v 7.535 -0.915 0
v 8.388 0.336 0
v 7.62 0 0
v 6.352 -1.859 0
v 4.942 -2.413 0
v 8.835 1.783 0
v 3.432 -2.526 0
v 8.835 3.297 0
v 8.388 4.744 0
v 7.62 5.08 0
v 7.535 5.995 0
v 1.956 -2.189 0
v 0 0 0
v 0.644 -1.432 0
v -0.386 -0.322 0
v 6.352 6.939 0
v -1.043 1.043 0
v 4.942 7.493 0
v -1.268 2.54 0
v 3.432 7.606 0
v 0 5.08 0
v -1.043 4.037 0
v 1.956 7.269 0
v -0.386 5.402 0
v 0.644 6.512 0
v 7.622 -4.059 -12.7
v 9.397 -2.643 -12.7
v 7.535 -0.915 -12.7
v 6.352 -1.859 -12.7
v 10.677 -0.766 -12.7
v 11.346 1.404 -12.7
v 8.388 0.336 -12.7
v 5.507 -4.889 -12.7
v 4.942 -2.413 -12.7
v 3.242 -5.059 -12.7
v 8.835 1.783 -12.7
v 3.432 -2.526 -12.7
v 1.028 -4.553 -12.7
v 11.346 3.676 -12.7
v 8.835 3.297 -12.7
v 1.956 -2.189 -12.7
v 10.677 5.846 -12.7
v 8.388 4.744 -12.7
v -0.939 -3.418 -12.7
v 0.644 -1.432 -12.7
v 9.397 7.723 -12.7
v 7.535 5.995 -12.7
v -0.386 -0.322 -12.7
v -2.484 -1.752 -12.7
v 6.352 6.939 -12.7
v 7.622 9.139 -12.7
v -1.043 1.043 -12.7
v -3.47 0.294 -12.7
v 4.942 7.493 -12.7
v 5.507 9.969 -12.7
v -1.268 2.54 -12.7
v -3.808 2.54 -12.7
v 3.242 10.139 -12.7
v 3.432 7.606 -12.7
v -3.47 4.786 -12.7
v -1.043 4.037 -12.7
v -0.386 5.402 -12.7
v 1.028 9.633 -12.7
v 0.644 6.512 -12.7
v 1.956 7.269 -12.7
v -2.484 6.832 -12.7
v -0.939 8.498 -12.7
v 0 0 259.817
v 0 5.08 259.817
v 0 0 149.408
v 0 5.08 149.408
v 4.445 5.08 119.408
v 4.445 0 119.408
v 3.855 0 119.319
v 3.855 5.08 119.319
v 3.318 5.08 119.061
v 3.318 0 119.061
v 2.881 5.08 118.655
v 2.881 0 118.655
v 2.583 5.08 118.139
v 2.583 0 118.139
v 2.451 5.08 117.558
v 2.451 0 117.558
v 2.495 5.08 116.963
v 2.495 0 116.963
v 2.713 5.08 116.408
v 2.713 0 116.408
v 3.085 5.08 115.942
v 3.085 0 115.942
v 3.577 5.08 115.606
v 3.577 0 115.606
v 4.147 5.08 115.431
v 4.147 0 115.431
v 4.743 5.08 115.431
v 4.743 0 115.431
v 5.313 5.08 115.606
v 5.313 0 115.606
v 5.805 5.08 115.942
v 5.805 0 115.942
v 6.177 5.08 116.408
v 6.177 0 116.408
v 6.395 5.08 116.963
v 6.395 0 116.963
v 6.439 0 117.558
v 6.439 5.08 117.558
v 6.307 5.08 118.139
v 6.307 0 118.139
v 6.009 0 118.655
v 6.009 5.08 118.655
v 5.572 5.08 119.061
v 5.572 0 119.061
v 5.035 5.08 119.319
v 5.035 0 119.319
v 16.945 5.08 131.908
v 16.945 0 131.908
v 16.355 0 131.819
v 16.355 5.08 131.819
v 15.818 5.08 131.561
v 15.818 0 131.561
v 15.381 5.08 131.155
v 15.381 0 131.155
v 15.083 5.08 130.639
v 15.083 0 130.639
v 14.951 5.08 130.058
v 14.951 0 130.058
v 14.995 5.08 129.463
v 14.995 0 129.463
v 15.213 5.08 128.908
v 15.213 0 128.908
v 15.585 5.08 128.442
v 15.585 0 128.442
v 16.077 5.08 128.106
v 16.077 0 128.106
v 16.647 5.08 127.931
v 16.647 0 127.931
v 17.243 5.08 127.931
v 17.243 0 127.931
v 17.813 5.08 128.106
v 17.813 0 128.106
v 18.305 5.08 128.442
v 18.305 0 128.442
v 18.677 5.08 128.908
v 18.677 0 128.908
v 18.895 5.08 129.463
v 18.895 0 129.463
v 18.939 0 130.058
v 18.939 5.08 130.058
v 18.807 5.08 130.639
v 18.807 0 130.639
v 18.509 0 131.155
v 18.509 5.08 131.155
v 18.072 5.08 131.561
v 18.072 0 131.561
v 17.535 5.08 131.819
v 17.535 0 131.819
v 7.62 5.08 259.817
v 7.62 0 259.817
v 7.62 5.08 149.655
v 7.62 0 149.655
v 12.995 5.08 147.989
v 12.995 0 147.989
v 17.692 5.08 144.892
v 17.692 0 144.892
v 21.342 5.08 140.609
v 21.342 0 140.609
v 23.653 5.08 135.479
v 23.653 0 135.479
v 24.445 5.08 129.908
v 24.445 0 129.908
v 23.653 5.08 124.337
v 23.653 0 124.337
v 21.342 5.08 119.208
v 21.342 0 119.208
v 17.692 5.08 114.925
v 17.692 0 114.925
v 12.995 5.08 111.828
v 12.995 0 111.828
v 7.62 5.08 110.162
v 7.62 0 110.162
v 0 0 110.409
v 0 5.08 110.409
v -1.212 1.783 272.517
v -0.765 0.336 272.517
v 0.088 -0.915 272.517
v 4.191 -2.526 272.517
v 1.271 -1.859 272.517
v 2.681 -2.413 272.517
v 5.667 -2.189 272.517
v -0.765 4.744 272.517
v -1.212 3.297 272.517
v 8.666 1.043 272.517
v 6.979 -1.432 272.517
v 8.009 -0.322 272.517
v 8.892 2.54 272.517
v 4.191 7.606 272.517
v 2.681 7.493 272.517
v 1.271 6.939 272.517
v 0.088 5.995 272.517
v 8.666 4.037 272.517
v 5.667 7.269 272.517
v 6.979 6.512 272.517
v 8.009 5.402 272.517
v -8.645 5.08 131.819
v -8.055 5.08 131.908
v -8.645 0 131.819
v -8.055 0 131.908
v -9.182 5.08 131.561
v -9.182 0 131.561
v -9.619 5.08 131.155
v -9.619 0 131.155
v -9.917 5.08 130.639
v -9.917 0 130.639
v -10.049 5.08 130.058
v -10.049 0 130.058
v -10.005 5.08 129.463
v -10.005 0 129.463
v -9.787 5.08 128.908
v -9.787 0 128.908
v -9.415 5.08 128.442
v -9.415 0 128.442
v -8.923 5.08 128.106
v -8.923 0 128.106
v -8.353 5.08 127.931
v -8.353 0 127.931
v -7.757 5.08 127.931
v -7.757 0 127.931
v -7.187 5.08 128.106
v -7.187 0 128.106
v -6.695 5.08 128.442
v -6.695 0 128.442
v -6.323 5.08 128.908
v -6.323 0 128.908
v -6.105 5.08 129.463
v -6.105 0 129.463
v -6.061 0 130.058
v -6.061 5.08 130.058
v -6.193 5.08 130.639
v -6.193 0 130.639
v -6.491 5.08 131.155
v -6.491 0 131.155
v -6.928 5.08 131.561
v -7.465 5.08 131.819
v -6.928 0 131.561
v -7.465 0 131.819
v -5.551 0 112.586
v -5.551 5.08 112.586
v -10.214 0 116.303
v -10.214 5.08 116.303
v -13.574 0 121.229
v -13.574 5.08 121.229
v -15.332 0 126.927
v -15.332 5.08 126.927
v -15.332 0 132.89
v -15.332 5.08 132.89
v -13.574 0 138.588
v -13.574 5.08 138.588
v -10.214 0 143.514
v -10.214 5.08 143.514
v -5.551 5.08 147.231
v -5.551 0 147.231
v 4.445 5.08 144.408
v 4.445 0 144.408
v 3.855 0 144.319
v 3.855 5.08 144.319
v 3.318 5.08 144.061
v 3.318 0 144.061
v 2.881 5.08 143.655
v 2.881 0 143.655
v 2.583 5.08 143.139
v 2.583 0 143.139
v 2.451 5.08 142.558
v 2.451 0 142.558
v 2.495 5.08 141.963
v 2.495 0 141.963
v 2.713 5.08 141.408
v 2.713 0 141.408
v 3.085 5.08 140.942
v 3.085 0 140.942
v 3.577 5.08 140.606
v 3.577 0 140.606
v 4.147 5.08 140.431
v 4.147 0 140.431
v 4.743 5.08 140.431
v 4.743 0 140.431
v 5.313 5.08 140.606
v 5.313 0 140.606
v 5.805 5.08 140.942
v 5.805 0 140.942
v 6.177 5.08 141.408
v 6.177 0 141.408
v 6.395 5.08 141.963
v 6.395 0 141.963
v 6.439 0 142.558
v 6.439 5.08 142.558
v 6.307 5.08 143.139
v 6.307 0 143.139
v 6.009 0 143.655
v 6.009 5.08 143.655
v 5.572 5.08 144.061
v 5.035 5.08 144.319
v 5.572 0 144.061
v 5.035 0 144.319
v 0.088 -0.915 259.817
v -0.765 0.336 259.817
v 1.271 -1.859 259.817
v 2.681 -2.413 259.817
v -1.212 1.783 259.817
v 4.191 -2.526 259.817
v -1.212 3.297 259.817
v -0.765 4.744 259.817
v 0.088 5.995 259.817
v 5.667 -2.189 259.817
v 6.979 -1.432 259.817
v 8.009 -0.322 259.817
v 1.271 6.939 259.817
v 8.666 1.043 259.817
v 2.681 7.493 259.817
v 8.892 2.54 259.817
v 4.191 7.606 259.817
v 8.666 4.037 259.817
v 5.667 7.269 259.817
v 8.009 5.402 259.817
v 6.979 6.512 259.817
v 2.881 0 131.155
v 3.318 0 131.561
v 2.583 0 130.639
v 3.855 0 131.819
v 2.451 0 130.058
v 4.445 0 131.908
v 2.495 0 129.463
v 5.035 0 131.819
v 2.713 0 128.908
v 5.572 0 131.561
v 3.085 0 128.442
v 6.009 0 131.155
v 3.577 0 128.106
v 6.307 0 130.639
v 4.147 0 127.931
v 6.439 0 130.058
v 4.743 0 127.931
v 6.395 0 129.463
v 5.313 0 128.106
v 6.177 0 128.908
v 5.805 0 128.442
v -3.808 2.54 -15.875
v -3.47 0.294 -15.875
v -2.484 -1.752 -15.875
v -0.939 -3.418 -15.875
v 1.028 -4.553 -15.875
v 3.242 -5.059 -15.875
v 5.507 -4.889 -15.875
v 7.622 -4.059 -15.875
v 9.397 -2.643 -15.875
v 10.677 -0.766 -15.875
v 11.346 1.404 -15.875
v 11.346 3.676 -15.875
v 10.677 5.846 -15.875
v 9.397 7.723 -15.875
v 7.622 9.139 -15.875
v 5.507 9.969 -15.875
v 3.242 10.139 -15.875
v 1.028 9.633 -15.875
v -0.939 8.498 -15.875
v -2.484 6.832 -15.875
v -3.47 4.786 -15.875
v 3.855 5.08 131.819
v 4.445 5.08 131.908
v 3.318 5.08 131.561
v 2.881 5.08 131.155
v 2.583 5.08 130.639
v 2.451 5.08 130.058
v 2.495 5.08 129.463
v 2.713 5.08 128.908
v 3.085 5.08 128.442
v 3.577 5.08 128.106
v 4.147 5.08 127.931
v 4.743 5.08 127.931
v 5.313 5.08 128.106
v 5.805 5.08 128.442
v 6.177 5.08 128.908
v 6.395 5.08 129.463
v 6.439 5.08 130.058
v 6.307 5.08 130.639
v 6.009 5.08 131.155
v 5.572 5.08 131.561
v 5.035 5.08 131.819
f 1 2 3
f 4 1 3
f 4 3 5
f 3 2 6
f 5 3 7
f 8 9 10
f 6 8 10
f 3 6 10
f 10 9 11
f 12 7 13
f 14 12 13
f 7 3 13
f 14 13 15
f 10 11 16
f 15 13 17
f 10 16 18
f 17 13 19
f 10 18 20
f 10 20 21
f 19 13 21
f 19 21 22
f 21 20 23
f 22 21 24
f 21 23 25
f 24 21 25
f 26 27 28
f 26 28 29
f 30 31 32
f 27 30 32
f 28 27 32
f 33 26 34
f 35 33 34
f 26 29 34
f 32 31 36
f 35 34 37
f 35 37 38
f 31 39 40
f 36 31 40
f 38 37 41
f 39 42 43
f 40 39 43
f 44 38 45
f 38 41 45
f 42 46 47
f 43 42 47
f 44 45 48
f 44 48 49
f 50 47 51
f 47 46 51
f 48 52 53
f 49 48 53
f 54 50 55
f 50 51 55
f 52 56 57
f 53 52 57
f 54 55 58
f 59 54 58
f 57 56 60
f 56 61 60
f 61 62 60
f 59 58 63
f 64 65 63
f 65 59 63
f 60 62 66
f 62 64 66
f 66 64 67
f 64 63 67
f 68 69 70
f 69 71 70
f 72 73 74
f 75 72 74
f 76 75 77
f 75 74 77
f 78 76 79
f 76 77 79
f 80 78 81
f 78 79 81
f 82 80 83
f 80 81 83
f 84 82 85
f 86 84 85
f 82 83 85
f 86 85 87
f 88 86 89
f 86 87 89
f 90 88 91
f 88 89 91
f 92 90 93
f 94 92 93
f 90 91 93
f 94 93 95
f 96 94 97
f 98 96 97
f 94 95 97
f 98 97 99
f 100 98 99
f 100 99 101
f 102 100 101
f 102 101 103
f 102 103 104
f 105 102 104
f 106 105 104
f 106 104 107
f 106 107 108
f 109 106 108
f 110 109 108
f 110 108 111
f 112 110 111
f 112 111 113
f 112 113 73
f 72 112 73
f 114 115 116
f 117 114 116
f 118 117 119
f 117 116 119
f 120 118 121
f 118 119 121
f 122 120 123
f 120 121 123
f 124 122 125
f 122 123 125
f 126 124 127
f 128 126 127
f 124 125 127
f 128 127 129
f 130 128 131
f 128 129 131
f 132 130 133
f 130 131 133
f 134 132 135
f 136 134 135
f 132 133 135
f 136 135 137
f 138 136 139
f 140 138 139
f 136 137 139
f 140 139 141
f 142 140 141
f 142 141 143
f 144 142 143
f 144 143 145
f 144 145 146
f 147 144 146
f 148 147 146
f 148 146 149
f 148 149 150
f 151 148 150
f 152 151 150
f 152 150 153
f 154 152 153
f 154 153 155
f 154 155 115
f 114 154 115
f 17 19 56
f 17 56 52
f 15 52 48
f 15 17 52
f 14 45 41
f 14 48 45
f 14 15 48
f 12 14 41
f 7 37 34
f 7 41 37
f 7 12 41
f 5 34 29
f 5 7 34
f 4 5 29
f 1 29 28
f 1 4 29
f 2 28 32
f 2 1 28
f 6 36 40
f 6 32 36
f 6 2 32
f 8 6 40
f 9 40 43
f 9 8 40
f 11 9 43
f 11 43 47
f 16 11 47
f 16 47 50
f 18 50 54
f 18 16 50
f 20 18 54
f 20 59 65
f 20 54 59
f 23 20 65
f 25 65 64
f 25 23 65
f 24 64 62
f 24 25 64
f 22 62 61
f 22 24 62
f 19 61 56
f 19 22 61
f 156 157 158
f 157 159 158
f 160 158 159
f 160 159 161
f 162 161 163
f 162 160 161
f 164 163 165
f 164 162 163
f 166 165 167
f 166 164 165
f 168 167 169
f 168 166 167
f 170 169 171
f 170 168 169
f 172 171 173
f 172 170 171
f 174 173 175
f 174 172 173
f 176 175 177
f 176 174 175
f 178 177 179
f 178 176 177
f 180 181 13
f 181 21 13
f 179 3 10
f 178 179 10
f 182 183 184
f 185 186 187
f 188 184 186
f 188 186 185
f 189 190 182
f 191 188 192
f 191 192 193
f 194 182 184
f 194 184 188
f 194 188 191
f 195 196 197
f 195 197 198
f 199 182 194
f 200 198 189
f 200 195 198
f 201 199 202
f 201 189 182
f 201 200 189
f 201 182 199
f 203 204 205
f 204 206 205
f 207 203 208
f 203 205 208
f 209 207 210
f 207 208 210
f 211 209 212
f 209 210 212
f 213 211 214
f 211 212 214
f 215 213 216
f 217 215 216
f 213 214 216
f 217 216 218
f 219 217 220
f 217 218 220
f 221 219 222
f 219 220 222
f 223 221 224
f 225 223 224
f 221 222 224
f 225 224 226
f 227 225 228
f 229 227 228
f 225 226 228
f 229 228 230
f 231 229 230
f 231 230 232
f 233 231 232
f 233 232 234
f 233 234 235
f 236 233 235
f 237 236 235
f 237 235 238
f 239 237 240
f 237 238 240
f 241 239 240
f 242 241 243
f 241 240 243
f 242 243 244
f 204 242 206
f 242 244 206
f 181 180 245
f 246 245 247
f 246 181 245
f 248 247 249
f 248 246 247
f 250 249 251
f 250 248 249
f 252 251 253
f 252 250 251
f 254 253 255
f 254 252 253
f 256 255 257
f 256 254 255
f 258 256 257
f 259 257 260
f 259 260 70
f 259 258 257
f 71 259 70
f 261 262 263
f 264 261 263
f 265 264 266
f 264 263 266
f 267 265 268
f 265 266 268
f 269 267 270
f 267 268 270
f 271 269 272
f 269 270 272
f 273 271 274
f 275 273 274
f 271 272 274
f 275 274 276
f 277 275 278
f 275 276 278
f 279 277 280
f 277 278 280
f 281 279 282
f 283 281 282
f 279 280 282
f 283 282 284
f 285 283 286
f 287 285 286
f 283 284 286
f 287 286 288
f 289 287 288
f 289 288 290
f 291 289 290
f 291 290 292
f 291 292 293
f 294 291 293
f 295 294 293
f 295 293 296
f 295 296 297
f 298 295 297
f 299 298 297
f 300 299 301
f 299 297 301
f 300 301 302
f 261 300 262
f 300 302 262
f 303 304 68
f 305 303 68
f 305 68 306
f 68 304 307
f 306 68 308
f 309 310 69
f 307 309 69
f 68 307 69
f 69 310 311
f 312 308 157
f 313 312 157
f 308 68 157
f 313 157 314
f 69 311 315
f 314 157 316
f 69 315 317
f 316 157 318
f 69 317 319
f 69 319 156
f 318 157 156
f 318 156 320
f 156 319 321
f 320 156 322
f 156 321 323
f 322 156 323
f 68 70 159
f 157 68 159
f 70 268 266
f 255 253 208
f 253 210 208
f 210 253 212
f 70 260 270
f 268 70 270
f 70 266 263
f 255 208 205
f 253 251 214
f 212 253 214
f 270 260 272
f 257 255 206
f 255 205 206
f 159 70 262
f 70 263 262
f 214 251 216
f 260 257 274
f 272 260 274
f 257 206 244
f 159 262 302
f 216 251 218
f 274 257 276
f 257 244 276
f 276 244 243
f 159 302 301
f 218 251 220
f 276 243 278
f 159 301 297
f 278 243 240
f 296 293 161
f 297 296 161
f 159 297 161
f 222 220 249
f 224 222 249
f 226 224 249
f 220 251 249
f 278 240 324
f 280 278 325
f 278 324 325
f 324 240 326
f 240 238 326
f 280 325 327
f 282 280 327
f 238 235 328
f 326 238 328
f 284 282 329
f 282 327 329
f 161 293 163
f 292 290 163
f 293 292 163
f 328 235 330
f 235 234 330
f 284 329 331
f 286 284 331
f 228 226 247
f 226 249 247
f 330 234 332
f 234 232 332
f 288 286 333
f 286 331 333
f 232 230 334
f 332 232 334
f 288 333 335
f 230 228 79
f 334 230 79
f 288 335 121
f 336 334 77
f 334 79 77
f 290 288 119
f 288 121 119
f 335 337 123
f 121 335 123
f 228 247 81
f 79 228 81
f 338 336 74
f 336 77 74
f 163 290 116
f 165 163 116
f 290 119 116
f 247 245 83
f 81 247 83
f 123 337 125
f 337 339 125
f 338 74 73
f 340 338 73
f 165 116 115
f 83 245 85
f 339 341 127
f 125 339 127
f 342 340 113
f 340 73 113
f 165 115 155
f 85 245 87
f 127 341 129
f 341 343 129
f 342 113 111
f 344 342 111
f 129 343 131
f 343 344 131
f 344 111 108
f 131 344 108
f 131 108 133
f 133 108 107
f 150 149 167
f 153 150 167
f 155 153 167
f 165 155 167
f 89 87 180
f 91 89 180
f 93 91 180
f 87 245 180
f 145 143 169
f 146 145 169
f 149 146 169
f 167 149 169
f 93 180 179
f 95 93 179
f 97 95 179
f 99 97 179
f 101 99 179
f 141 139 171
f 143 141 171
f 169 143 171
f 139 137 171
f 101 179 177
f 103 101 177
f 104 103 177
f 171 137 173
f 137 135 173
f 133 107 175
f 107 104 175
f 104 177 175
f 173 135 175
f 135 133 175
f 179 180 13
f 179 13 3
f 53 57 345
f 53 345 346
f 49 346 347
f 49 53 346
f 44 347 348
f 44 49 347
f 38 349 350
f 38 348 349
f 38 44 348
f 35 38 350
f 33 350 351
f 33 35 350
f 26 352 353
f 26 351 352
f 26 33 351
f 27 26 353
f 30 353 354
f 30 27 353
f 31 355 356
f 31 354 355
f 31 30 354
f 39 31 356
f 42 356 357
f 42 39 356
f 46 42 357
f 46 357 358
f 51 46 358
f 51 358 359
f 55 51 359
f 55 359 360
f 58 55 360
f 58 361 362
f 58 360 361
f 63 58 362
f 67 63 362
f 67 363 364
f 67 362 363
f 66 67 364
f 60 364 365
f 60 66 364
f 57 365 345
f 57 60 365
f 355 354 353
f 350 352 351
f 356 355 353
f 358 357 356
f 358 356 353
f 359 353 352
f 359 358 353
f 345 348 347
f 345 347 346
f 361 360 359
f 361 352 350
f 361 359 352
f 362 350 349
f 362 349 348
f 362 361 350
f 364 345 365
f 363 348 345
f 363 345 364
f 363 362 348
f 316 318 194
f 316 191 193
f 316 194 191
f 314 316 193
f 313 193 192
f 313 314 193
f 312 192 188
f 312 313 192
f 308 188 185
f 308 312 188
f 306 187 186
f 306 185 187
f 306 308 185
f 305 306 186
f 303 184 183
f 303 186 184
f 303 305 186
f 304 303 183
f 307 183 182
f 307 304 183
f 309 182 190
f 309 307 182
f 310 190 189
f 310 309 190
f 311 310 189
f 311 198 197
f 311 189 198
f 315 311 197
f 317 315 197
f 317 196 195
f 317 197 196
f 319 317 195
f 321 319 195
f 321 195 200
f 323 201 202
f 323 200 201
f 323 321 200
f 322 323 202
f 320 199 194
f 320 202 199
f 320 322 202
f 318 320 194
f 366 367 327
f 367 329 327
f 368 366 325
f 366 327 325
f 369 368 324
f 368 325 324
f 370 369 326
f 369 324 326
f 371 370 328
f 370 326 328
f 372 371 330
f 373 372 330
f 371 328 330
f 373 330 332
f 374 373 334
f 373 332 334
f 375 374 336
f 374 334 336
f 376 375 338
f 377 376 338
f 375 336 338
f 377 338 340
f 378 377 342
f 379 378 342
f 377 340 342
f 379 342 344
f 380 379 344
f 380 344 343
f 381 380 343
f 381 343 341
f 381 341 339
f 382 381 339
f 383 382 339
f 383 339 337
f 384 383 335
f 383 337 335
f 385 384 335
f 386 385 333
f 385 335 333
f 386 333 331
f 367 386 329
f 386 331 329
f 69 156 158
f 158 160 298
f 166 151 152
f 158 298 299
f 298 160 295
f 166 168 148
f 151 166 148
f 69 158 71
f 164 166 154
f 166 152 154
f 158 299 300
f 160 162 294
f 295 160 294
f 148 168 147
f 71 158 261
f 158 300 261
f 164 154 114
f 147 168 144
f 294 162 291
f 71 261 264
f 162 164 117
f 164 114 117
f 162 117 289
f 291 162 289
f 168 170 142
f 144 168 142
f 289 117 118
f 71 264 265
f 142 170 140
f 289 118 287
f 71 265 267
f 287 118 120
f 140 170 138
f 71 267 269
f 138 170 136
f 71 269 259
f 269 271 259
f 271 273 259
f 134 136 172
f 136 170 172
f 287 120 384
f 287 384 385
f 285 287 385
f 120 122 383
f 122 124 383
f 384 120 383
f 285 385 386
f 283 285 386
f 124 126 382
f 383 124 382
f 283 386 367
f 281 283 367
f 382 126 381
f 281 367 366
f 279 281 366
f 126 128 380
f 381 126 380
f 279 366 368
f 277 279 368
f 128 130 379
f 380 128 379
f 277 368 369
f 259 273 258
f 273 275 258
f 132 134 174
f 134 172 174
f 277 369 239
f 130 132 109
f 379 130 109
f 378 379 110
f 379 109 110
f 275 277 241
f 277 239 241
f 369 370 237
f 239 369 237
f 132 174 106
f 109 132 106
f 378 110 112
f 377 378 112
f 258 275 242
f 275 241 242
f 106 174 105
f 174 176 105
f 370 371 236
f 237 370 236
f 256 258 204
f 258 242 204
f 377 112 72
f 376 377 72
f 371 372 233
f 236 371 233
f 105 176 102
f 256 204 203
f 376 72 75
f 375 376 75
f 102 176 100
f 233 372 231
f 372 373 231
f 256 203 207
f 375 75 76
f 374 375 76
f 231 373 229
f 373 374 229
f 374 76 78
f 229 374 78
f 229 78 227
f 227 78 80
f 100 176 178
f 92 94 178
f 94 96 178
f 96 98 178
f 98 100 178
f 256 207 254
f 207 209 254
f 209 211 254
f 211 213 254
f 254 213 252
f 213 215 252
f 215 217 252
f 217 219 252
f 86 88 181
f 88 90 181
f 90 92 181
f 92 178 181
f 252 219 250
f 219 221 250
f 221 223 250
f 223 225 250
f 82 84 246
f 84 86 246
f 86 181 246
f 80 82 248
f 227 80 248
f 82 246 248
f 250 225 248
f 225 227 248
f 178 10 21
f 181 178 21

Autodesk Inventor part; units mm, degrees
ref_plane "YZ Plane" through (0, 0, 0) normal (1, 0, 0) x (0, 1, 0)
ref_plane "XZ Plane" through (0, 0, 0) normal (0, 1, 0) x (-1, 0, 0)
ref_plane "XY Plane" through (0, 0, 0) normal (0, 0, 1) x (1, 0, 0)
sketch "Sketch1" plane through (0, 0, 0) normal (0, 0, 1) x (1, 0, 0)
  line L0 (0, 0) -> (7.62, 0)
  line L1 (7.62, 0) -> (7.62, 5.08)
  line L2 (7.62, 5.08) -> (0, 5.08)
  line L3 (0, 5.08) -> (0, 0)
  dimension "d0" = 7.62
  dimension "d1" = 5.08
extrude "Extrusion1" add sketch "Sketch1" along normal blind 259.8166
sketch "Sketch2" plane through (0, 0, 259.8166) normal (0, 0, 1) x (1, 0, 0)
  circle A0 centre (3.8115, 2.54) radius 5.08
  line L0 (7.62, 5.08) -> (0, 5.08) projected
  line L1 (7.62, 0) -> (7.62, 5.08) projected
  point P0 (0, 0)
  dimension "d4" = 10.16
  dimension "d5" = 2.54
  dimension "d6" = 3.8085
extrude "Extrusion2" add sketch "Sketch2" along normal blind 12.7
sketch "Sketch3" plane through (0, 0, 0) normal (0, 0, -1) x (-1, 0, 0)
  circle A0 centre (-3.8115, 2.54) radius 5.08
  circle A1 centre (-3.8115, 2.54) radius 5.08 projected
  point P0 (0, 0)
  dimension "d9" = 10.16
extrude "Extrusion3" add sketch "Sketch3" along normal blind 12.7
sketch "Sketch4" plane through (3.8115, 2.54, -12.7) normal (0, 0, -1) x (-1, 0, 0)
  circle A0 centre (0, 0) radius 7.62
  point P0 (3.8115, -2.54)
  dimension "d12" = 15.24
extrude "Extrusion4" add sketch "Sketch4" along normal blind 3.175
sketch "Sketch5" plane through (0, 5.08, 259.8166) normal (0, 1, 0) x (1, 0, 0)
  line L0 (7.62, 259.8166) -> (7.62, 0) projected
  line L1 (-1.2685, 259.8166) -> (8.8915, 259.8166) projected
  circle A0 centre (4.445, 129.9083) radius 20
  point P0 (0, 259.8166)
  dimension "d15" = 3.175
  dimension "d16" = 259.8166
  dimension "d17" = 129.9083
  dimension "d18" = 40
extrude "Extrusion5" add sketch "Sketch5" against normal up to surface (5.08 mm away)
sketch "Sketch6" plane through (0, 5.08, 259.8166) normal (0, 1, 0) x (1, 0, 0)
  circle A0 centre (4.445, 129.9083) radius 20
  arc A1 (0, 149.4081) -> (0, 110.4085) centre (4.445, 129.9083) ccw projected
  circle A2 centre (4.445, 129.9083) radius 12.5
  point P0 (0, 259.8166)
  point P1 (-8.055, 129.9083)
  point P2 (4.445, 142.4083)
  point P3 (16.945, 129.9083)
  point P4 (4.445, 117.4083)
  dimension "d21" = 40
  dimension "d22" = 0
  dimension "d23" = 0
  dimension "d24" = 25
hole "Hole1" at (4.445, 5.08, 129.9083) at (-8.055, 5.08, 129.9083) at (4.445, 5.08, 117.4083) at (16.945, 5.08, 129.9083) at (4.445, 5.08, 142.4083) direction (0, -1, 0) diameter 4 end through all
properties part number "MotorMount_Part"
